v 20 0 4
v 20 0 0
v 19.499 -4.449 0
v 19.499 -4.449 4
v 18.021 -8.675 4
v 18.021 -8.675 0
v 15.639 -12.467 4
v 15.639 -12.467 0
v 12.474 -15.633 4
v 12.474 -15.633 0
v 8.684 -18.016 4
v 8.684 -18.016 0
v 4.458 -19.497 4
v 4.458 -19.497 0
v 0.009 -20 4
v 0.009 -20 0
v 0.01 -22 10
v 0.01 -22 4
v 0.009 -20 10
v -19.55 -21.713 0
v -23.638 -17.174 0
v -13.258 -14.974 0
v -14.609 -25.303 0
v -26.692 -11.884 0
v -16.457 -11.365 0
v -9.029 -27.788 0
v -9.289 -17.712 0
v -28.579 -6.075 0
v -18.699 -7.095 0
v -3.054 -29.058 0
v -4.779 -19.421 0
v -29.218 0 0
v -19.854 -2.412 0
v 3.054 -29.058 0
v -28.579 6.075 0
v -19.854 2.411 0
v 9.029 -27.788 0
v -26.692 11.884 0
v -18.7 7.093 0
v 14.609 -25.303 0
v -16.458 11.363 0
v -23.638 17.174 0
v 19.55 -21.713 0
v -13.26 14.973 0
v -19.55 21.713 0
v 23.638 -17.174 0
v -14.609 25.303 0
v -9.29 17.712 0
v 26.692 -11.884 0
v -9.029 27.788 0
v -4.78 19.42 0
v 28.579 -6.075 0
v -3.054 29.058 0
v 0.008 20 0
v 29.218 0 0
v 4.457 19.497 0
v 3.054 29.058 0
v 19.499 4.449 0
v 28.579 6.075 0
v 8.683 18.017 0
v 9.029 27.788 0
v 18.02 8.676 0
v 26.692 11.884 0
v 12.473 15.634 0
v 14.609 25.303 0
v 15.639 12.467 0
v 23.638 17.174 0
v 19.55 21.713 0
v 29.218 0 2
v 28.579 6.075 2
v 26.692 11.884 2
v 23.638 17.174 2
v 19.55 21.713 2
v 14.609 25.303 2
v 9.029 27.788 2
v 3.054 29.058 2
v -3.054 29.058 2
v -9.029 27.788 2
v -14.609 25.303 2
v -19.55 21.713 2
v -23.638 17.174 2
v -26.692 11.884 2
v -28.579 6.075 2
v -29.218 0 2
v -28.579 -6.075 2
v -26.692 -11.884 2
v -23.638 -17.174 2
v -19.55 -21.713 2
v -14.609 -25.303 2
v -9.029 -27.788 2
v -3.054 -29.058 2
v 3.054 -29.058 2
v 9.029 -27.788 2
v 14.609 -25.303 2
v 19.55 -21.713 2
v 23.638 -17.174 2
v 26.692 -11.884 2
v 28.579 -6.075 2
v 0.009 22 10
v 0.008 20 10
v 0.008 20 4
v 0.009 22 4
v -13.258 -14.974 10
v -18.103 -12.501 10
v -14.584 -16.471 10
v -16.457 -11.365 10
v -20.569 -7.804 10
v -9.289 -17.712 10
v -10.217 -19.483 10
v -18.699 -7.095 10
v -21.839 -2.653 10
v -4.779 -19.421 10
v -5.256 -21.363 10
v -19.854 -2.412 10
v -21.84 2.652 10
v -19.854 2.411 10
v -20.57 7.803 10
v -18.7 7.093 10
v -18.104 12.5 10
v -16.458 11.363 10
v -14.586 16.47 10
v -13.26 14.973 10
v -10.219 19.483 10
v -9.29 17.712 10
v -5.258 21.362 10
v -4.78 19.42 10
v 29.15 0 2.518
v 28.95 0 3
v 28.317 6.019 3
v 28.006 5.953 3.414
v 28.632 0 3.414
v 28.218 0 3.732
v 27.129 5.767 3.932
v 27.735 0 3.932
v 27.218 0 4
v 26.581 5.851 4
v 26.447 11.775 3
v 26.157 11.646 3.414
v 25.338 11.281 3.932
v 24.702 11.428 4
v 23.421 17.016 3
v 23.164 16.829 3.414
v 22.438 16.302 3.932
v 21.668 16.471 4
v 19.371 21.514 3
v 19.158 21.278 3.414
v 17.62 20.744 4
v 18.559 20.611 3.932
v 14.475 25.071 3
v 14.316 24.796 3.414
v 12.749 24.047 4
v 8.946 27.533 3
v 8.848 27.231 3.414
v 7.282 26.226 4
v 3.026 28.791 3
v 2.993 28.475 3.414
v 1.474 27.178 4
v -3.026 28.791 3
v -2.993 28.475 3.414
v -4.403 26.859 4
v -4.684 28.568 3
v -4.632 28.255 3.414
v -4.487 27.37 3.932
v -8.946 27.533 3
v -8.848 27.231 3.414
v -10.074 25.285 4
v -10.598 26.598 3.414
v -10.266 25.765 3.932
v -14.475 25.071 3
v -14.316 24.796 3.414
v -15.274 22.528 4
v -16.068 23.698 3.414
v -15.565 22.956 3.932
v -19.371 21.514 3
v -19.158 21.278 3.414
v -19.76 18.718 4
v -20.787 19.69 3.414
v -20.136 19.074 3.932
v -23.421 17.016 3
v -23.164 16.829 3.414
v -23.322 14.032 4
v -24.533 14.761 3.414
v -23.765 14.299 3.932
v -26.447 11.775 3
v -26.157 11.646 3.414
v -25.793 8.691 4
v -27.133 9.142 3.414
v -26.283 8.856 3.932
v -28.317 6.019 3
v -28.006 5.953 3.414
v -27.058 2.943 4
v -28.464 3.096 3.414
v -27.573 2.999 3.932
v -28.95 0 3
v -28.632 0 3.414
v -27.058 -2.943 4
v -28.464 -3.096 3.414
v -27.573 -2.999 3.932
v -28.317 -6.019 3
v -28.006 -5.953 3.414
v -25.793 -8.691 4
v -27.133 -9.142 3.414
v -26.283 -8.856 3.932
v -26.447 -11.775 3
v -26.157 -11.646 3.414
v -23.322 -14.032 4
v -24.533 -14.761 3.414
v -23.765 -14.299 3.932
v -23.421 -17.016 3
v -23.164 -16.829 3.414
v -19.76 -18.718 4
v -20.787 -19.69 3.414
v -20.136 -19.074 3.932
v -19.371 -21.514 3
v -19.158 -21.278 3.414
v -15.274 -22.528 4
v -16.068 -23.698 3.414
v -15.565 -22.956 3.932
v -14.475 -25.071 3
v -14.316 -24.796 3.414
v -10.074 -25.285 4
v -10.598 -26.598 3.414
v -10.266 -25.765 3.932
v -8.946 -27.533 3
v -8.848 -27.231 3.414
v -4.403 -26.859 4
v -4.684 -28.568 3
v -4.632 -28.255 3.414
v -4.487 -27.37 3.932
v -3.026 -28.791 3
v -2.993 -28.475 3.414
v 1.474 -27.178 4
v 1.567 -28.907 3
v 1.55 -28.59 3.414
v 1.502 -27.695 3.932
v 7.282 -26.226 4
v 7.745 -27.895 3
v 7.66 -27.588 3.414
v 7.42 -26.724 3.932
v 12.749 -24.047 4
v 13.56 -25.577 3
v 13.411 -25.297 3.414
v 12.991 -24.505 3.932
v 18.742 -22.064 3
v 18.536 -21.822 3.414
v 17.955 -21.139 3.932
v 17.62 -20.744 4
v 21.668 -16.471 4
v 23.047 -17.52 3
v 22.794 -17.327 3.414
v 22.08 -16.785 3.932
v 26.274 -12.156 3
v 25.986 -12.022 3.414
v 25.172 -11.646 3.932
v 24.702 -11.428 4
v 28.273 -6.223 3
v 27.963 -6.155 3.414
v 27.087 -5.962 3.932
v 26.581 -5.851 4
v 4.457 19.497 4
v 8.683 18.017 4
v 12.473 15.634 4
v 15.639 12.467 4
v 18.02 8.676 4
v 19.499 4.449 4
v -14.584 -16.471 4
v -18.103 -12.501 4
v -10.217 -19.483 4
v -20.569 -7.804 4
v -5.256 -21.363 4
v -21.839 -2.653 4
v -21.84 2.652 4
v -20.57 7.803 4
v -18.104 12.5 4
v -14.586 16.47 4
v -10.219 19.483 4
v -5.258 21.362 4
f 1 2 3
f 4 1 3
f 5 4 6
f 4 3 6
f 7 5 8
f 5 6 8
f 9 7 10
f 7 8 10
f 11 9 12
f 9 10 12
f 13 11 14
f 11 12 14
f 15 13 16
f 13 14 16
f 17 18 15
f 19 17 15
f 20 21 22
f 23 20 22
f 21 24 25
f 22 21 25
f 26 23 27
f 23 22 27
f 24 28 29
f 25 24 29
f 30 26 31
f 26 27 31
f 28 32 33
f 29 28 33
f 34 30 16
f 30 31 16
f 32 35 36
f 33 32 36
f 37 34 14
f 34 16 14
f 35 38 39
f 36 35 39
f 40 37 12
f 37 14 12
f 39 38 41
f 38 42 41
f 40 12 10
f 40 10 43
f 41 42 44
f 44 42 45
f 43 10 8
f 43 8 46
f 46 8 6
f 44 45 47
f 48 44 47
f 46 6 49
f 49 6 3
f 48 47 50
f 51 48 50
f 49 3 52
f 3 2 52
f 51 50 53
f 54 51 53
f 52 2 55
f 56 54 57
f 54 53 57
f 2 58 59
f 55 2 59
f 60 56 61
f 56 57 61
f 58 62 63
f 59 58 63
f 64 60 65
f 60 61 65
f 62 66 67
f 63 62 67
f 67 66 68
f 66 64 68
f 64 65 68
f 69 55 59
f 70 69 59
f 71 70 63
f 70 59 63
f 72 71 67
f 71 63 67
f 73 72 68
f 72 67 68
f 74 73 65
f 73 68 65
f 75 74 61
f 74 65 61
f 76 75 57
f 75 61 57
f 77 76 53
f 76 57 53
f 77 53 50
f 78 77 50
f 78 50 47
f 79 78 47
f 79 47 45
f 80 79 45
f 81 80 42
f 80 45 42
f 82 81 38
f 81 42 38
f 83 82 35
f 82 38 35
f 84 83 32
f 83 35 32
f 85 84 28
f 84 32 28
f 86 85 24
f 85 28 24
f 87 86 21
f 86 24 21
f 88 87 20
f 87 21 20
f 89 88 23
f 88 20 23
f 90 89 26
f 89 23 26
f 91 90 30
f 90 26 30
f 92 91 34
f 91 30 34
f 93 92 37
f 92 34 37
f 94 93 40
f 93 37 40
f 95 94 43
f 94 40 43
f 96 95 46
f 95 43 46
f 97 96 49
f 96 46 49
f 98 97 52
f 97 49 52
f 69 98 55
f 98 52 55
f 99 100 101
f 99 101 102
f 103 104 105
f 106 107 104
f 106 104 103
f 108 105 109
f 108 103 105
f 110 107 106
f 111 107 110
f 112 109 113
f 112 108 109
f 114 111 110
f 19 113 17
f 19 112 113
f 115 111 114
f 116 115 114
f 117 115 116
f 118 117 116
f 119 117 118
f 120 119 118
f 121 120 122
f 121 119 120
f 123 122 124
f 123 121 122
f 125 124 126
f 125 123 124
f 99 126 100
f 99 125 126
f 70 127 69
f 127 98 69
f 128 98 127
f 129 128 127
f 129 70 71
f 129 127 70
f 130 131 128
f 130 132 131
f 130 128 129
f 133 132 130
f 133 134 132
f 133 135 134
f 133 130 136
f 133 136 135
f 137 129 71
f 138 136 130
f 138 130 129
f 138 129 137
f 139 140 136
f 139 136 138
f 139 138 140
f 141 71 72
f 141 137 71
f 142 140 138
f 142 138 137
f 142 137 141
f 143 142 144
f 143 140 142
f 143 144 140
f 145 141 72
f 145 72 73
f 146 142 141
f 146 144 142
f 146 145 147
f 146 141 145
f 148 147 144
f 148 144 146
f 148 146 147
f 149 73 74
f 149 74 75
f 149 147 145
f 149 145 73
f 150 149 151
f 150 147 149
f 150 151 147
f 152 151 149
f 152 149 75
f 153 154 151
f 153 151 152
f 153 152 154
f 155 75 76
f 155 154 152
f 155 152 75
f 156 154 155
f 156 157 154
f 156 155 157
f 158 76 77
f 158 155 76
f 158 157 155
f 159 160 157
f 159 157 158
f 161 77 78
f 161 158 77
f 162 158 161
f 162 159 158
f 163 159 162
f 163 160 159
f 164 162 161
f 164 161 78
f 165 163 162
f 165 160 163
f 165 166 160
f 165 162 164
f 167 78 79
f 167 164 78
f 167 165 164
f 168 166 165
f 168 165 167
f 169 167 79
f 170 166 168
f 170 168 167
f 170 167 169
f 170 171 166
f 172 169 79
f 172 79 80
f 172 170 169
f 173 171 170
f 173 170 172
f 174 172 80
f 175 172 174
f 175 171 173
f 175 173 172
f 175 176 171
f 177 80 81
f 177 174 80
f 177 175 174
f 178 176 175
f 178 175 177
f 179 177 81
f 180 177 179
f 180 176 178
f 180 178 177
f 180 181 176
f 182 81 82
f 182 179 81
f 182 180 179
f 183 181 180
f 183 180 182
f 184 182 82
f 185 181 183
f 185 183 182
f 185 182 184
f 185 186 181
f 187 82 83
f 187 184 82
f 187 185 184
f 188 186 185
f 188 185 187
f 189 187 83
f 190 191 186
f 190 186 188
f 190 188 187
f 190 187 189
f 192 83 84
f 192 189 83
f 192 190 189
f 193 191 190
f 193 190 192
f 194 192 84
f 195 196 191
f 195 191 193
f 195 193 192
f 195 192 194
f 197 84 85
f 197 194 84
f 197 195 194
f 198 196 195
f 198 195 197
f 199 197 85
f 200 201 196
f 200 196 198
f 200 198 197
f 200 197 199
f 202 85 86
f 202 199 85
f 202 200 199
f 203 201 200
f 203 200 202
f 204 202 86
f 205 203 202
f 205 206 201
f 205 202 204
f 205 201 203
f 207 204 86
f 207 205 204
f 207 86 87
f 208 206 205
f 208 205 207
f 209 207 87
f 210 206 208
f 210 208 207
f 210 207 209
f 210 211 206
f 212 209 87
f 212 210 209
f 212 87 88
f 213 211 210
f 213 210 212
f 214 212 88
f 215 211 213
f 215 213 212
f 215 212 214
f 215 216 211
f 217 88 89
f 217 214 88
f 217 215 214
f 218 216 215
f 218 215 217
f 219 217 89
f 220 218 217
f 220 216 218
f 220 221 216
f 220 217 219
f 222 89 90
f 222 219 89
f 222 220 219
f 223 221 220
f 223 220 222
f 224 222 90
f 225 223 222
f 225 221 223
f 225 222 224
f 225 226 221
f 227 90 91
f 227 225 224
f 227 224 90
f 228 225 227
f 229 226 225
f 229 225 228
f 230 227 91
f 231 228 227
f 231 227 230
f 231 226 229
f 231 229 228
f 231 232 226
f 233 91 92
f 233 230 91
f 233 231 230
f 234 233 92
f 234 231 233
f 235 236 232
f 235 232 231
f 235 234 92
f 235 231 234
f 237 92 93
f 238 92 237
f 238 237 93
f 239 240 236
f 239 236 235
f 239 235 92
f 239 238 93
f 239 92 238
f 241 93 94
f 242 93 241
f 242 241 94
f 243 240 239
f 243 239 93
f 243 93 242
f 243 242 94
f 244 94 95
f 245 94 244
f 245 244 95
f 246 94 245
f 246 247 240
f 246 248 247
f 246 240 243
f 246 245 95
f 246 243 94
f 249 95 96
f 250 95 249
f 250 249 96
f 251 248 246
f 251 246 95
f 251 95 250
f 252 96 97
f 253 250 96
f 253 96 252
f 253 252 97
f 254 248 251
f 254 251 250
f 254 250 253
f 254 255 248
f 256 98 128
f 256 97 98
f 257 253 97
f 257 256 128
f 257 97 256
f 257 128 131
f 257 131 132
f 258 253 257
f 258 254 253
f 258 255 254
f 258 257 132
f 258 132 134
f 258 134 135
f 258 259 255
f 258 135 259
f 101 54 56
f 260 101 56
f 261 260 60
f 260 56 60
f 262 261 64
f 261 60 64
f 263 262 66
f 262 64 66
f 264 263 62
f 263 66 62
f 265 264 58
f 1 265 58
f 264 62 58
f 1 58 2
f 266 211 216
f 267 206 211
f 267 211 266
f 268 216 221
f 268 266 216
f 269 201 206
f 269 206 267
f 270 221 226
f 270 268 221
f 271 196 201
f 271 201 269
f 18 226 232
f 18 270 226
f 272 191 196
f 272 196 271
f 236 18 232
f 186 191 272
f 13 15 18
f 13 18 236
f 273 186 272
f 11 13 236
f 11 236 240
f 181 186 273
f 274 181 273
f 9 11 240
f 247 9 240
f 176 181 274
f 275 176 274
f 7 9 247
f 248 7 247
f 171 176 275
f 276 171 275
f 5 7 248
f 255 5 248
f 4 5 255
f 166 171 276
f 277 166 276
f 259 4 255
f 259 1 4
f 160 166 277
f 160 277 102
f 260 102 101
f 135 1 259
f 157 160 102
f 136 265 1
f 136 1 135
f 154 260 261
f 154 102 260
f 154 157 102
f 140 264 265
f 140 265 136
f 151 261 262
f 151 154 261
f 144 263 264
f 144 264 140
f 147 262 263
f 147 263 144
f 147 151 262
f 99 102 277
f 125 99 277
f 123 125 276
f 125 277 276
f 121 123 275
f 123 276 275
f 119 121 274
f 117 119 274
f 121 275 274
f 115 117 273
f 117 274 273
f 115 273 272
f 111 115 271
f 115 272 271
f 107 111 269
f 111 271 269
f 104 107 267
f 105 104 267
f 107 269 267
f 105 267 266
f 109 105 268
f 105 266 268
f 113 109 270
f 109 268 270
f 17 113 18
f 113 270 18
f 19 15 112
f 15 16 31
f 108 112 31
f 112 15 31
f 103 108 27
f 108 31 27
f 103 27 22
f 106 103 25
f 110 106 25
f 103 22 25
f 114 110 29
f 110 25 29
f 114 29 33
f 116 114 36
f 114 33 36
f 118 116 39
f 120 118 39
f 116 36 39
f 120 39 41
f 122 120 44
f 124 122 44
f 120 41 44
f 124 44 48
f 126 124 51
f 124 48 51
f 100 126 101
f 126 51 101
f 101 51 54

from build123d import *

# Parameters (mm, degrees)
F1_DEPTH = 10
F0_R     = 29.217715
F2_DEPTH = 4
F3_R     = 2
F4_DEPTH = 4


with BuildPart() as f1:
    # F0 (on Top) → F1 (new body)
    with BuildSketch(Plane.XY):
        with BuildLine():
            ThreePointArc((0.009298, -19.999998), (-20, -0.000754), (0.007791, 19.999998))
            Line((0.007791, 19.999998), (0.00857, 21.999998))
            ThreePointArc((0.00857, 21.999998), (-22, -0.000829), (0.010228, -21.999998))
            Line((0.010228, -21.999998), (0.009298, -19.999998))
        make_face()
    extrude(amount=F1_DEPTH)

    # F0 (on Top) → F2 (join)
    with BuildSketch(Plane.XY):
        Circle(F0_R)
        with BuildLine():
            ThreePointArc((0.010228, -21.999998), (-22, -0.000829), (0.00857, 21.999998))
            ThreePointArc((0.00857, 21.999998), (15.559379, 15.553319), (22, 0))
            ThreePointArc((22, 0), (15.559965, -15.552733), (0.010228, -21.999998))
        make_face(mode=Mode.SUBTRACT)
    extrude(amount=F2_DEPTH)

    # F3
    f3_edges = [f1.edges().sort_by_distance(p)[0] for p in [
        (-29.217715, 0, 4),
    ]]
    fillet(f3_edges, radius=F3_R)

    # F0 (on Top) → F4 (join)
    with BuildSketch(Plane.XY):
        with BuildLine():
            ThreePointArc((0.007791, 19.999998), (14.14489, 14.139381), (20, 0))
            ThreePointArc((20, 0), (14.145423, -14.138848), (0.009298, -19.999998))
            Line((0.009298, -19.999998), (0.010228, -21.999998))
            ThreePointArc((0.010228, -21.999998), (15.559965, -15.552733), (22, 0))
            ThreePointArc((22, 0), (15.559379, 15.553319), (0.00857, 21.999998))
            Line((0.00857, 21.999998), (0.007791, 19.999998))
        make_face()
    extrude(amount=F4_DEPTH)


solid = f1.part
